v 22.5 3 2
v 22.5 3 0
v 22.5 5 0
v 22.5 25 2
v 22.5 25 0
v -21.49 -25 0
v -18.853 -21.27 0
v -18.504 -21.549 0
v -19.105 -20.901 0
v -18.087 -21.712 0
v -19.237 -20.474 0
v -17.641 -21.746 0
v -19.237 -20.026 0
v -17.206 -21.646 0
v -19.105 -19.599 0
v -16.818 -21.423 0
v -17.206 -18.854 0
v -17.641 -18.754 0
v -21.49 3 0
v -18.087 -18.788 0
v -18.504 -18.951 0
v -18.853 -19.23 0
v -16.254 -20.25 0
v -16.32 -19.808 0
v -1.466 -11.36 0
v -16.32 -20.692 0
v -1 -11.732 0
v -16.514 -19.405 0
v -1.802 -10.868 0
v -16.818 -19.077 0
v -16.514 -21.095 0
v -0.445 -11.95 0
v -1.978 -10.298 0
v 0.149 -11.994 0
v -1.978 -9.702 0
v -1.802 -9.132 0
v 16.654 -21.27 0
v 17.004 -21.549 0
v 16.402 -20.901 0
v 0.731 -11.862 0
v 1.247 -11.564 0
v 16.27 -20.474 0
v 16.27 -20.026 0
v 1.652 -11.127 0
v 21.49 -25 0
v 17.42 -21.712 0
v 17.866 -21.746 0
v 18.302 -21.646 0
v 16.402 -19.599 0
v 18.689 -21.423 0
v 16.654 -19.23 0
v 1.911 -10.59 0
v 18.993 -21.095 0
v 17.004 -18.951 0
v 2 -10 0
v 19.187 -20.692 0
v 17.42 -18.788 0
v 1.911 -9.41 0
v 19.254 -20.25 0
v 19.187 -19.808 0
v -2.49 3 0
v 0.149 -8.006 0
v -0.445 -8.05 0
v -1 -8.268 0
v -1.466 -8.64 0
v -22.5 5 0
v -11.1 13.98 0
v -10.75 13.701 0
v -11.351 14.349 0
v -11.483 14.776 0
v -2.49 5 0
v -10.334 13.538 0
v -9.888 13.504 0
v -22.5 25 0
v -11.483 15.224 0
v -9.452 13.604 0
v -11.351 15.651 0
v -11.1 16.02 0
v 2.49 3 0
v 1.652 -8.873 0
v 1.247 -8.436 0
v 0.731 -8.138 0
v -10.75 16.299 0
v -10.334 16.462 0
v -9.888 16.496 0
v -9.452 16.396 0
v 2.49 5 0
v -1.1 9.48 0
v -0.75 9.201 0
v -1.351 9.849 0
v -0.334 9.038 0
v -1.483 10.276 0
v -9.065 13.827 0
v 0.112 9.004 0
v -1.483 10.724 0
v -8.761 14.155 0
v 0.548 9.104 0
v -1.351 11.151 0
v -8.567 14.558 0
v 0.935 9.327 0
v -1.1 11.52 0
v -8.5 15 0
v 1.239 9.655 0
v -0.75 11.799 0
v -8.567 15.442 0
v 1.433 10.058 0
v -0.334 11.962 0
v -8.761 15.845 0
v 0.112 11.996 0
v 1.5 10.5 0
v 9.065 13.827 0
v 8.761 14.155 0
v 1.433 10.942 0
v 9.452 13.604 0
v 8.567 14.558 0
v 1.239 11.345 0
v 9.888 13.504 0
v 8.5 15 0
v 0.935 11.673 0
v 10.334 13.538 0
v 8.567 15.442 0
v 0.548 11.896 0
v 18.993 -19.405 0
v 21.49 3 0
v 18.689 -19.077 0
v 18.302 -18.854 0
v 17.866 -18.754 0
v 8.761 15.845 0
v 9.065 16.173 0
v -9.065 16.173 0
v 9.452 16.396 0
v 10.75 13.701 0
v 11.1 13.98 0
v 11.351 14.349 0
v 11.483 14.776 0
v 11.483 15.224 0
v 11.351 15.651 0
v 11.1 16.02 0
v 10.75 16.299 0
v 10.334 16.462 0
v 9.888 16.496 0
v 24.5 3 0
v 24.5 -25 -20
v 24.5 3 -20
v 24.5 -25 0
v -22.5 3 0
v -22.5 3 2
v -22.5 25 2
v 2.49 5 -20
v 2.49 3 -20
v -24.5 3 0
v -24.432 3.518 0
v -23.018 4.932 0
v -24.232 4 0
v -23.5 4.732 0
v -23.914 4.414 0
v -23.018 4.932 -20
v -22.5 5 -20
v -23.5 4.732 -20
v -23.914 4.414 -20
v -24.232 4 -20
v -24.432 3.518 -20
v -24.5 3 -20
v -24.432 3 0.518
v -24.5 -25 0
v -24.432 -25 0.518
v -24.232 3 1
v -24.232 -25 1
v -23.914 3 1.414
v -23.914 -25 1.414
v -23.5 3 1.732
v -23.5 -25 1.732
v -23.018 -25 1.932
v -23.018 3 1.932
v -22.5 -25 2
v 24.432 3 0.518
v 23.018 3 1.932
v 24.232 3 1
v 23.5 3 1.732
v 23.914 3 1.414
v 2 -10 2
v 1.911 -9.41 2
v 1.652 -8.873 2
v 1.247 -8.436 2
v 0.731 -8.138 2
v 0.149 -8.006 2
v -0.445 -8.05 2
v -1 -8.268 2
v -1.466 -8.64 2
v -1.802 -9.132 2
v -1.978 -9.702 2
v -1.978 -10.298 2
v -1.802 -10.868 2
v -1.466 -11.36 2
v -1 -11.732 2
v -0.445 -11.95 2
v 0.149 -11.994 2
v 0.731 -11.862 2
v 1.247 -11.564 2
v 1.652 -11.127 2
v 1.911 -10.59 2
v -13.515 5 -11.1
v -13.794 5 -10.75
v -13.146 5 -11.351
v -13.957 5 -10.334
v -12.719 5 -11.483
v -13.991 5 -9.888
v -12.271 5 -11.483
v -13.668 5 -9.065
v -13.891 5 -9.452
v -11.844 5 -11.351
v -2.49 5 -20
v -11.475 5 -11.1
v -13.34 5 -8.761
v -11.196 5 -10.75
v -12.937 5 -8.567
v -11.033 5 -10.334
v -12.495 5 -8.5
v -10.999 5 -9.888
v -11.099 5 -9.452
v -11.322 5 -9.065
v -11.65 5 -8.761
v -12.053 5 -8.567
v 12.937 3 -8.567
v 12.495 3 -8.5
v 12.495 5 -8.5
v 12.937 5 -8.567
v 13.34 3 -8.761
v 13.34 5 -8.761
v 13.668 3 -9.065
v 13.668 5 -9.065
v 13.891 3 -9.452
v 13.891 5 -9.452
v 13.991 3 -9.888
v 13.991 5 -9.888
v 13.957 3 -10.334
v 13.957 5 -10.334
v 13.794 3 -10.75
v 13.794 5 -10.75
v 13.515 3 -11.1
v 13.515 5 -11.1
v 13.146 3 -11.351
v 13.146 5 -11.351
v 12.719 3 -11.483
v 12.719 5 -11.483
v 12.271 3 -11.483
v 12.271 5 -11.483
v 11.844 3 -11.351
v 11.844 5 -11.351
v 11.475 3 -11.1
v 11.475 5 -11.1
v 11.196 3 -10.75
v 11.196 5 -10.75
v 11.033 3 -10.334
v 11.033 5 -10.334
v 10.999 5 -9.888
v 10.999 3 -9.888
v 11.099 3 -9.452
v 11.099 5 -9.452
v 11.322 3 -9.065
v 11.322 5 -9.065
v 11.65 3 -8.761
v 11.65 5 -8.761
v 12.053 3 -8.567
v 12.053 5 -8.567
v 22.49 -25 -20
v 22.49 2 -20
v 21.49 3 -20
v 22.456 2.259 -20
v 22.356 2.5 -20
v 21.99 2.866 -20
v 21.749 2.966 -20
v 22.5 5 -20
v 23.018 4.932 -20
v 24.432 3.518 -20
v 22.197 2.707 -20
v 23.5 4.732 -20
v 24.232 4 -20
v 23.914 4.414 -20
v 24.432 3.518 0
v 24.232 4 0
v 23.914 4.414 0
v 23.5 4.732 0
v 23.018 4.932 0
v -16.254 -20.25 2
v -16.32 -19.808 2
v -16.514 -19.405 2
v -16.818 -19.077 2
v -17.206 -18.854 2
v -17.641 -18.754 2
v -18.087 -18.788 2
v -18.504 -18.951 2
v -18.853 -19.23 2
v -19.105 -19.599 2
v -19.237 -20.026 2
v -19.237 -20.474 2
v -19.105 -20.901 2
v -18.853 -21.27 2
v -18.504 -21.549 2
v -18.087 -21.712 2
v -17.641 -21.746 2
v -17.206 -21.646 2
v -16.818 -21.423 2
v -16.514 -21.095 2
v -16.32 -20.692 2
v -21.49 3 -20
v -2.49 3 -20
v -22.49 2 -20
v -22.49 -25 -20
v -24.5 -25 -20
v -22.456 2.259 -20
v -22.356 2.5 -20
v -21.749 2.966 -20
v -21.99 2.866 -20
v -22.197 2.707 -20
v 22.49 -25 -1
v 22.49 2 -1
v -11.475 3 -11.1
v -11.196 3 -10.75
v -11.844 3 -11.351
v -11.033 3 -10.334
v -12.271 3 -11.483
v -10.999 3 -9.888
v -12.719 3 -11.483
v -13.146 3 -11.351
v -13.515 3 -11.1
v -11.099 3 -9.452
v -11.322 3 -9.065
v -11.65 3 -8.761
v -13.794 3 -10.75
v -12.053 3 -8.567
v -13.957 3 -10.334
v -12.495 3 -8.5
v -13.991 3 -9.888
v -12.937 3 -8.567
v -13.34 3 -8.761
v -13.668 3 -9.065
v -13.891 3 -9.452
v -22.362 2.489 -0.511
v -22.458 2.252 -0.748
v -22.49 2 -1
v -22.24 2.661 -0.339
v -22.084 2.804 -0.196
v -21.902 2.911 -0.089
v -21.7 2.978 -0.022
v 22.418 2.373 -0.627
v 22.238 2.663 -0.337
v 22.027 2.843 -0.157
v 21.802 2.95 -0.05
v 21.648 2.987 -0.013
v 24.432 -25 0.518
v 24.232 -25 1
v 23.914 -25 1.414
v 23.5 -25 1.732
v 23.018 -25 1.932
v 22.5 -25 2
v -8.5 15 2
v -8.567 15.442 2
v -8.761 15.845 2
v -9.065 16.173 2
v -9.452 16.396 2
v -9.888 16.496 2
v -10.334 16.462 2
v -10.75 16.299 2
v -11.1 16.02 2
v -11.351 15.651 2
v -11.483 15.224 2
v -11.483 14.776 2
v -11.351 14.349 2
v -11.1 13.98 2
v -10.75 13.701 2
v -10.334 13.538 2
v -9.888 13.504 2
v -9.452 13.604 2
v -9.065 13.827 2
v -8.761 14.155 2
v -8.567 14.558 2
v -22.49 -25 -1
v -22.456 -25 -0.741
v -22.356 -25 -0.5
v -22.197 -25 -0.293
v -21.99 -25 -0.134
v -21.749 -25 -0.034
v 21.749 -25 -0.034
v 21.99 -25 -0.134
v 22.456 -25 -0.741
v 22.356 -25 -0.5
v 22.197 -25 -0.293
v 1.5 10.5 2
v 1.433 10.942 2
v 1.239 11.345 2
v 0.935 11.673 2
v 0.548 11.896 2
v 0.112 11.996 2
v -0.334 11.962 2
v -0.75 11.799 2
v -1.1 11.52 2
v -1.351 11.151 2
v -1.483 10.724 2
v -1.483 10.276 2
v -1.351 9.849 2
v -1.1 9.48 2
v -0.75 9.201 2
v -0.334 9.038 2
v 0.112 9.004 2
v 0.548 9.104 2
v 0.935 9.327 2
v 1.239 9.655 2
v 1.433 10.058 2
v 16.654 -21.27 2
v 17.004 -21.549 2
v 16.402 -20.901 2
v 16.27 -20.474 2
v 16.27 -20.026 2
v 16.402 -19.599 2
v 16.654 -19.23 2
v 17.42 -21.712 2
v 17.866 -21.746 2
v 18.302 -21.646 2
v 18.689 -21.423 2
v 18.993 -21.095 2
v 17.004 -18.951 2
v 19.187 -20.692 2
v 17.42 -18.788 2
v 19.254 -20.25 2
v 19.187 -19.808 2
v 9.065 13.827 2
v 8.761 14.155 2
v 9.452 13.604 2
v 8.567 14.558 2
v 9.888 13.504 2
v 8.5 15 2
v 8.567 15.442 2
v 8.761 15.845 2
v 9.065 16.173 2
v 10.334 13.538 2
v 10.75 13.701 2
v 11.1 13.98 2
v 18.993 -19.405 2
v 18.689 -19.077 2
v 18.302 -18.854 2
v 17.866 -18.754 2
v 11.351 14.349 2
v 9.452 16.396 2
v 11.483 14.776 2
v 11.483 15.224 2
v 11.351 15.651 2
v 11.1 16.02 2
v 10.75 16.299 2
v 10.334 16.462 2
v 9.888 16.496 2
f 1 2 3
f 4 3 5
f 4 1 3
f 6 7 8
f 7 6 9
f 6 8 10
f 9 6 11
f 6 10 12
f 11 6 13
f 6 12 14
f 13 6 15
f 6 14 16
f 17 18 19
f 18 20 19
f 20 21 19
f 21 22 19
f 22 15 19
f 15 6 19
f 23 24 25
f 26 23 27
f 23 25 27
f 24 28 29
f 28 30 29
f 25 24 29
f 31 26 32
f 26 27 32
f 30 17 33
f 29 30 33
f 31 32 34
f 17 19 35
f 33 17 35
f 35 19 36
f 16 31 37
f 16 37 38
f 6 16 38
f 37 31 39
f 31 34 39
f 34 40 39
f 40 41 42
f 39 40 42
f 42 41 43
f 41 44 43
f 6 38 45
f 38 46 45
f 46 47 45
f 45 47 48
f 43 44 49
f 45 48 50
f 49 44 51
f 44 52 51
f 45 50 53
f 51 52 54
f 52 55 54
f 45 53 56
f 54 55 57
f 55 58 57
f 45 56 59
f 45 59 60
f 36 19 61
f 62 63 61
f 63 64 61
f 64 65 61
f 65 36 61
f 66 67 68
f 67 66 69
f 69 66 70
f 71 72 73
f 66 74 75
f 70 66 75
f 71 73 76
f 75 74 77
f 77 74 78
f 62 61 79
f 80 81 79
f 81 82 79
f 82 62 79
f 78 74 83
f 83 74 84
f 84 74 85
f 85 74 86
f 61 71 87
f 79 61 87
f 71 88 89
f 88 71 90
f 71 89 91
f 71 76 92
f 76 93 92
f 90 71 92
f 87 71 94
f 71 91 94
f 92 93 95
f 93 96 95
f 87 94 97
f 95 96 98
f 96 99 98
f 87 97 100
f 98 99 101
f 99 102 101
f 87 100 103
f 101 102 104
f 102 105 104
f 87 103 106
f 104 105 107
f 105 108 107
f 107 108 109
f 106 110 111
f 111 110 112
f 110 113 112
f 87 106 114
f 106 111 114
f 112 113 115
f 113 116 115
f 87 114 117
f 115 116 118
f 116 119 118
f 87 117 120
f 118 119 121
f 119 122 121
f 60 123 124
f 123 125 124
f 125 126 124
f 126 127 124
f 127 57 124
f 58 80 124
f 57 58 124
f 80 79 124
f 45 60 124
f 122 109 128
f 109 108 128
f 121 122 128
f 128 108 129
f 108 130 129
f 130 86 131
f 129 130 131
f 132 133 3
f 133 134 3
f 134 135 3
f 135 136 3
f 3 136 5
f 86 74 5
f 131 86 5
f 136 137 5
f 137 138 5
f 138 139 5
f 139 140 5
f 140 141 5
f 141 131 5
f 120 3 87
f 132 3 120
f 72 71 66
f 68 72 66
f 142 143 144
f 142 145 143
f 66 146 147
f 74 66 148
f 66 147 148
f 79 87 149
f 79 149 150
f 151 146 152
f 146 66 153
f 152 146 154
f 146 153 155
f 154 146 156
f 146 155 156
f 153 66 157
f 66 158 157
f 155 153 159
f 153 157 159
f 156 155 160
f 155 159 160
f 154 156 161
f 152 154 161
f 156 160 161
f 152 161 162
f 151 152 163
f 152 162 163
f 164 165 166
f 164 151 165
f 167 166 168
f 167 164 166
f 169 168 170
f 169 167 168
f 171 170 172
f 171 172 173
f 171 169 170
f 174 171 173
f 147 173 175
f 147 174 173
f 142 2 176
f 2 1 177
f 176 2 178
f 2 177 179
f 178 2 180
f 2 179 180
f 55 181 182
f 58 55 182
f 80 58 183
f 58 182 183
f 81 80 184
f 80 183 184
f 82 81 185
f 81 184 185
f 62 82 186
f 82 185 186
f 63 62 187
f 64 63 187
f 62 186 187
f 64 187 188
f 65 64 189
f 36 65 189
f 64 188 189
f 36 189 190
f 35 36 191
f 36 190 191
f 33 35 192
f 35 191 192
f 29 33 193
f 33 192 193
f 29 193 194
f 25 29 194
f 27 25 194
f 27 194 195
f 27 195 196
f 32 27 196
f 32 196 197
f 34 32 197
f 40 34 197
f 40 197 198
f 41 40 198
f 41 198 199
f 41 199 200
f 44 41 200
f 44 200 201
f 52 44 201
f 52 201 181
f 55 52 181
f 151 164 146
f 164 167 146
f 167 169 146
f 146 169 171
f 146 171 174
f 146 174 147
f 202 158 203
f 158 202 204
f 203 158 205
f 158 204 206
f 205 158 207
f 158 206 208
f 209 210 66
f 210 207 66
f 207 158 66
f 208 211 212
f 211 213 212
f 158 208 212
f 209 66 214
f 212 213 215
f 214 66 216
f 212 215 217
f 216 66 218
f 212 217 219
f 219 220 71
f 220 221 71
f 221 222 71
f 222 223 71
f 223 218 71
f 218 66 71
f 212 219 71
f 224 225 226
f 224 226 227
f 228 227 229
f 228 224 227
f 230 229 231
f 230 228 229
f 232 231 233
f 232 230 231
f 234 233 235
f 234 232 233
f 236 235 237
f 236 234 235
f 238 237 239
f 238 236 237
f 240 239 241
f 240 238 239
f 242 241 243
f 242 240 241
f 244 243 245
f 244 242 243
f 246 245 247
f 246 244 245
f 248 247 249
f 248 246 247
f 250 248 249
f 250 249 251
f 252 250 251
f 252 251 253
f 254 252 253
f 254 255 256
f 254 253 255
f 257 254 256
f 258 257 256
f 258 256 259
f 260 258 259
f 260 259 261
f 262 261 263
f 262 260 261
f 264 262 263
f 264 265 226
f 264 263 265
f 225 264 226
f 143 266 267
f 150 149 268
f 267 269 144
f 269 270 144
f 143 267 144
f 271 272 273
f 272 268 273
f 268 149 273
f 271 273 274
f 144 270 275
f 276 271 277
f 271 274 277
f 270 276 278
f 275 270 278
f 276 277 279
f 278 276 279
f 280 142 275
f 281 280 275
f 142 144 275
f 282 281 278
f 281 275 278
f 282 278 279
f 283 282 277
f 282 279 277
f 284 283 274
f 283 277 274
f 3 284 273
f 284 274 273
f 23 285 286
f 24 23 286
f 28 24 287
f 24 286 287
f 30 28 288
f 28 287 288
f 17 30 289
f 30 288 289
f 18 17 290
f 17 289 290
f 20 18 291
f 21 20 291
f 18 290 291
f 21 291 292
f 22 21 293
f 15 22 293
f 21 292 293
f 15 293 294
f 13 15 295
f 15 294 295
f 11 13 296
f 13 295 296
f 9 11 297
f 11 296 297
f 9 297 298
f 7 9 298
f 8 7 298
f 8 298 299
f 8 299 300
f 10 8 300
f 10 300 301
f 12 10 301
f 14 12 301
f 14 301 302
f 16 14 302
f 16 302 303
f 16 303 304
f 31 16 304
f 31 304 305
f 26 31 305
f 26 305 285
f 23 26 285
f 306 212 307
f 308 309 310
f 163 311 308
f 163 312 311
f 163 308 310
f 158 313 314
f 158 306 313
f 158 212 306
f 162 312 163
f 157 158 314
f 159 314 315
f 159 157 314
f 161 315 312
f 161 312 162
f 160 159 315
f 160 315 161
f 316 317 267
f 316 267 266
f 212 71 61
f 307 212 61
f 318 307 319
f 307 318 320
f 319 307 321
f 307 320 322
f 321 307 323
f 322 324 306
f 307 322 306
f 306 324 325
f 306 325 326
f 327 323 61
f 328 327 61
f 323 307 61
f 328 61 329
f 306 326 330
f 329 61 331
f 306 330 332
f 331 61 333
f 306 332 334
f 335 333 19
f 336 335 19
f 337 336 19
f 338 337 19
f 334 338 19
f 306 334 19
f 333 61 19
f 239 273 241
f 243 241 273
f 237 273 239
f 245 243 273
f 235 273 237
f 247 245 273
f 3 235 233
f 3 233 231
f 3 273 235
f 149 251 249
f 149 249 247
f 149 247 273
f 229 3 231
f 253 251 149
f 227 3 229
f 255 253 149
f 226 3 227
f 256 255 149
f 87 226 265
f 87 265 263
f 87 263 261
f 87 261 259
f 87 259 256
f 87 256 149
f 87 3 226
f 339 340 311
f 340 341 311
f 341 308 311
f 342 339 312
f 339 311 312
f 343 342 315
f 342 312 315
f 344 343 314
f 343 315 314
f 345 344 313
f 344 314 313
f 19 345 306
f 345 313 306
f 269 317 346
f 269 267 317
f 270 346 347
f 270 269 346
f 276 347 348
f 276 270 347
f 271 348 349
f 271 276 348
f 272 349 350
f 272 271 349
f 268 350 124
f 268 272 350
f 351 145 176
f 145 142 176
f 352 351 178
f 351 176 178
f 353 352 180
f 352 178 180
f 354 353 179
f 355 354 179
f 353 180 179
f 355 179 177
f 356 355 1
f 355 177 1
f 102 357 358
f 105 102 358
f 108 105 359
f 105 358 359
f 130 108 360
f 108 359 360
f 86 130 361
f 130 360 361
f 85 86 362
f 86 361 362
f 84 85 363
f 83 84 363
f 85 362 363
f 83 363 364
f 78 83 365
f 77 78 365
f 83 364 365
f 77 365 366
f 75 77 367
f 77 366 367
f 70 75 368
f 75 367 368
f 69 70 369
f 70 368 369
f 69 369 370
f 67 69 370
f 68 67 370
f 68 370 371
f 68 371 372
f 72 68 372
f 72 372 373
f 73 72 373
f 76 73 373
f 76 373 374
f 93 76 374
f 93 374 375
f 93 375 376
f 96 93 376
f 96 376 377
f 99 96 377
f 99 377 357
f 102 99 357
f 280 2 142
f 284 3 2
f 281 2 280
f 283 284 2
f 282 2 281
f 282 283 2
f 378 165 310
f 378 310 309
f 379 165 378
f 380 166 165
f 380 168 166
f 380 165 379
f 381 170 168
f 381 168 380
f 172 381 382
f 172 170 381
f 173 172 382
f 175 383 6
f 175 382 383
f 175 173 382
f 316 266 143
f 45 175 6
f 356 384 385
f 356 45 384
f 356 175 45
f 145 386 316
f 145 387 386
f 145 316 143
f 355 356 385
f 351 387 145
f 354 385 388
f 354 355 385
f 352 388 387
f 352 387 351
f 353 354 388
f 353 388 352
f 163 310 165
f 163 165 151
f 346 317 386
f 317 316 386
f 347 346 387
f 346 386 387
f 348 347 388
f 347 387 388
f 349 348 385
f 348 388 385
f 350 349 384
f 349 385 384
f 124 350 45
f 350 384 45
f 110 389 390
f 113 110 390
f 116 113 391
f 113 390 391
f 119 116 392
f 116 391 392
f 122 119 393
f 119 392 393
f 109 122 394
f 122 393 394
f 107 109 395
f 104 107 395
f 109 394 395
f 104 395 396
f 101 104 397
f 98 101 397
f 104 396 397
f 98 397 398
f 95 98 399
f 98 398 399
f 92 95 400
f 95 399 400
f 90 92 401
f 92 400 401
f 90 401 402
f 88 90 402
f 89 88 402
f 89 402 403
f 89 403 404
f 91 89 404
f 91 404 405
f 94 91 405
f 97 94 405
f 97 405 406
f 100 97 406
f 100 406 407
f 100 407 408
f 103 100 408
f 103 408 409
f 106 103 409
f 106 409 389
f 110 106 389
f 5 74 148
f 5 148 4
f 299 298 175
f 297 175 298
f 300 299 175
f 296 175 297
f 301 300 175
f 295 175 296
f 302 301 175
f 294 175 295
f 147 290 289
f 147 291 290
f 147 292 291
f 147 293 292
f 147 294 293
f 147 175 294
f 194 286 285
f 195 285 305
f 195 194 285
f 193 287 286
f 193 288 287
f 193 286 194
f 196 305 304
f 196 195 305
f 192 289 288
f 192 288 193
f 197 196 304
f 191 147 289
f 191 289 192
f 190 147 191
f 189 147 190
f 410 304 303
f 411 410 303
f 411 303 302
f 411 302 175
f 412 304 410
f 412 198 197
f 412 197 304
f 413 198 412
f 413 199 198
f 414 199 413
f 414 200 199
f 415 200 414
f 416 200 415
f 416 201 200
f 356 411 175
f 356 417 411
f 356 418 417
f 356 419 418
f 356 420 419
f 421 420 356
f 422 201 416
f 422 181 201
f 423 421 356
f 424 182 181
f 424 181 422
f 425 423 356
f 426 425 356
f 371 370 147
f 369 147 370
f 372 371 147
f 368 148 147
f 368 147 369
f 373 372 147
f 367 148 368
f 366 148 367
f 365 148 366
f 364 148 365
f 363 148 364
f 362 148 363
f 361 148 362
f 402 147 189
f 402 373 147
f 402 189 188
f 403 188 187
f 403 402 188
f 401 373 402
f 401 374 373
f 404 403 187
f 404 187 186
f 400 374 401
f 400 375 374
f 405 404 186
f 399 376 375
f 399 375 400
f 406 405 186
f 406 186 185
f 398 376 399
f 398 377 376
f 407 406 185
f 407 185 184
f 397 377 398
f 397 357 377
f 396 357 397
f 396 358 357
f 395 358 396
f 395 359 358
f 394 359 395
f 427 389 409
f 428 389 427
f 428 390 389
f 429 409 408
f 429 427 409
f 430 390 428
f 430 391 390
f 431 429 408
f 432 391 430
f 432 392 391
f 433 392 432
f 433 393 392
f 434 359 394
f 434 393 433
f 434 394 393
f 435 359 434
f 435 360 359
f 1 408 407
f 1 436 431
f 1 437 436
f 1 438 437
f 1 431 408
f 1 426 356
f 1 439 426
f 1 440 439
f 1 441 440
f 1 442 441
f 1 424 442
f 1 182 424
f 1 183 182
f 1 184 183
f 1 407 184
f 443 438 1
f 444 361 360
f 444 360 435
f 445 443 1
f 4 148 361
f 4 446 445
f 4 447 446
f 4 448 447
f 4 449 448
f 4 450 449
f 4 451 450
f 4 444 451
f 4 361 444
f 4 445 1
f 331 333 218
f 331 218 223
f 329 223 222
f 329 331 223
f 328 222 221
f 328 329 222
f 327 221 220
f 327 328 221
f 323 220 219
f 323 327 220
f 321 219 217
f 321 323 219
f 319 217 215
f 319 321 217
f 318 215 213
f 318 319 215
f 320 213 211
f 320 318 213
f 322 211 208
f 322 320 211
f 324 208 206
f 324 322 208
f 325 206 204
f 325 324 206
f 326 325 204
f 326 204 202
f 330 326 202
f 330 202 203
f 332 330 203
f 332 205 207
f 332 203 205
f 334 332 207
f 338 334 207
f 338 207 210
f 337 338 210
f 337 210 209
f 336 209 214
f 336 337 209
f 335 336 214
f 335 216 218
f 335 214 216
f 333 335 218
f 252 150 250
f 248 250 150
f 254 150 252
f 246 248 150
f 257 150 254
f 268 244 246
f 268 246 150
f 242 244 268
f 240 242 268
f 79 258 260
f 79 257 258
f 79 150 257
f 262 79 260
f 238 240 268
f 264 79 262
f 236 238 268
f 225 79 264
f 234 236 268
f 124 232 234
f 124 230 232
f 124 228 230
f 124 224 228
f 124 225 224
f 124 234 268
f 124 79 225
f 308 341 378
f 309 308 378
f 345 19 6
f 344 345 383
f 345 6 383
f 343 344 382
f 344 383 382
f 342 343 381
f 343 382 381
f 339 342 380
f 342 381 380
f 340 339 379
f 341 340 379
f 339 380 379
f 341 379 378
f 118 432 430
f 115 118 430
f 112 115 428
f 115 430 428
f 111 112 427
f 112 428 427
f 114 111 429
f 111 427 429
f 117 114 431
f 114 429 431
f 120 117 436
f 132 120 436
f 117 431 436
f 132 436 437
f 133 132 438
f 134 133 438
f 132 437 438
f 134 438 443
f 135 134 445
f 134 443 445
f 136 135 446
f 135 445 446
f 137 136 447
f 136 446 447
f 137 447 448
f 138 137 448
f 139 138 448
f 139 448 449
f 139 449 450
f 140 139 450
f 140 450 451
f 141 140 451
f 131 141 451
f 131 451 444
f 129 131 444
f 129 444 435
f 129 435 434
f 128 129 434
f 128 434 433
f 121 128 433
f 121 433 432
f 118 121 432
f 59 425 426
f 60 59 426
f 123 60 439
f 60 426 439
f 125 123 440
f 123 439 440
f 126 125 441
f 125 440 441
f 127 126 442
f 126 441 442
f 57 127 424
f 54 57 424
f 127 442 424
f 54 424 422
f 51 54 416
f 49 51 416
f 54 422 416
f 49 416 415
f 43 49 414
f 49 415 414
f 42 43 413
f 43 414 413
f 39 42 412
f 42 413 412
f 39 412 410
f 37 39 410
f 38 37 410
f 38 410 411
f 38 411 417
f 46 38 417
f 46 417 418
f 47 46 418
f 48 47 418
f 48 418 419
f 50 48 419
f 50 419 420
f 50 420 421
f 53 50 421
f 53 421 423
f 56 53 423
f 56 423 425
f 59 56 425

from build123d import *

# Parameters (mm, degrees)
SKETCH1_W               = 49
SKETCH1_H               = 50
BOSS_EXTRUDE1_DEPTH     = 2
SKETCH3_W               = 2
SKETCH3_H               = 22
CUT_EXTRUDE1_DEPTH      = 36.060661717
BOSS_EXTRUDE5_DEPTH     = 20
FILLET3_R               = 2
FILLET4_R               = 1
SKETCH8_R               = 2
SKETCH8_R_2             = 1.5
CUT_EXTRUDE2_DEPTH      = 10
CUT_EXTRUDE3_DEPTH      = 44.591857038
CUT_EXTRUDE3_DEPTH_BACK = 44.591857038
SKETCH9_R               = 1.5


with BuildPart() as part:
    # Sketch1 → Boss-Extrude1 (new body)
    with BuildSketch(Plane.XY):
        Rectangle(SKETCH1_W, SKETCH1_H)
    extrude(amount=BOSS_EXTRUDE1_DEPTH)

    # Sketch3 → Cut-Extrude1 (cut, through all)
    with BuildSketch(Plane.XY.offset(2)):
        with Locations((-23.5, 14)):
            Rectangle(SKETCH3_W, SKETCH3_H)
        with Locations((23.5, 14)):
            Rectangle(SKETCH3_W, SKETCH3_H)
    extrude(amount=-CUT_EXTRUDE1_DEPTH, mode=Mode.SUBTRACT)

    # Sketch7 → Boss-Extrude5 (add)
    with BuildSketch(Plane(origin=(0, 0, 0), x_dir=(-1, 0, 0), z_dir=(0, 0, -1))):
        Polygon((-24.5, -25), (-24.5, 5), (-2.49, 5), (-2.49, 3), (-22.49, 3), (-22.49, -25), align=None)
        Polygon((24.5, 5), (2.49, 5), (2.49, 3), (22.49, 3), (22.49, -25), (24.5, -25), align=None)
    extrude(amount=BOSS_EXTRUDE5_DEPTH)

    # Fillet3
    fillet3_edges = [part.edges().sort_by_distance(p)[0] for p in [
        (-24.5, 5, -10),
        (24.5, 5, -10),
        (-24.5, -11, 2),
        (24.5, -11, 2),
    ]]
    fillet(fillet3_edges, radius=FILLET3_R)

    # Fillet4
    fillet4_edges = [part.edges().sort_by_distance(p)[0] for p in [
        (22.49, -11, 0),
        (22.49, 3, -10),
        (-22.49, -11, 0),
        (-22.49, 3, -10),
    ]]
    fillet(fillet4_edges, radius=FILLET4_R)

    # Sketch8 → Cut-Extrude2 (cut)
    with BuildSketch(Plane.XY.offset(2)):
        with Locations((0, -10)):
            Circle(SKETCH8_R)
        with Locations((0, 10.5)):
            Circle(SKETCH8_R_2)
        with Locations((17.753520778, -20.25)):
            Circle(SKETCH8_R_2)
        with Locations((-17.753520778, -20.25)):
            Circle(SKETCH8_R_2)
        with Locations((-10, 15)):
            Circle(SKETCH8_R_2)
        with Locations(Location((10, 15, 0), (0, 0, 180))):
            Circle(SKETCH8_R_2)
    extrude(amount=-CUT_EXTRUDE2_DEPTH, mode=Mode.SUBTRACT)

    # Sketch9 → Cut-Extrude3 (cut, two sides: drawn at the far end of the back side and taken through both)
    with BuildSketch(Plane(origin=(0, 5, 0), x_dir=(1, 0, 0), z_dir=(0, 1, 0)).offset(-CUT_EXTRUDE3_DEPTH_BACK)):
        with Locations(Location((12.495, 10, 0), (0, 0, 270))):
            Circle(SKETCH9_R)
        with Locations(Location((-12.495, 10, 0), (0, 0, 270))):
            Circle(SKETCH9_R)
    extrude(amount=CUT_EXTRUDE3_DEPTH + CUT_EXTRUDE3_DEPTH_BACK, mode=Mode.SUBTRACT)


solid = part.part
